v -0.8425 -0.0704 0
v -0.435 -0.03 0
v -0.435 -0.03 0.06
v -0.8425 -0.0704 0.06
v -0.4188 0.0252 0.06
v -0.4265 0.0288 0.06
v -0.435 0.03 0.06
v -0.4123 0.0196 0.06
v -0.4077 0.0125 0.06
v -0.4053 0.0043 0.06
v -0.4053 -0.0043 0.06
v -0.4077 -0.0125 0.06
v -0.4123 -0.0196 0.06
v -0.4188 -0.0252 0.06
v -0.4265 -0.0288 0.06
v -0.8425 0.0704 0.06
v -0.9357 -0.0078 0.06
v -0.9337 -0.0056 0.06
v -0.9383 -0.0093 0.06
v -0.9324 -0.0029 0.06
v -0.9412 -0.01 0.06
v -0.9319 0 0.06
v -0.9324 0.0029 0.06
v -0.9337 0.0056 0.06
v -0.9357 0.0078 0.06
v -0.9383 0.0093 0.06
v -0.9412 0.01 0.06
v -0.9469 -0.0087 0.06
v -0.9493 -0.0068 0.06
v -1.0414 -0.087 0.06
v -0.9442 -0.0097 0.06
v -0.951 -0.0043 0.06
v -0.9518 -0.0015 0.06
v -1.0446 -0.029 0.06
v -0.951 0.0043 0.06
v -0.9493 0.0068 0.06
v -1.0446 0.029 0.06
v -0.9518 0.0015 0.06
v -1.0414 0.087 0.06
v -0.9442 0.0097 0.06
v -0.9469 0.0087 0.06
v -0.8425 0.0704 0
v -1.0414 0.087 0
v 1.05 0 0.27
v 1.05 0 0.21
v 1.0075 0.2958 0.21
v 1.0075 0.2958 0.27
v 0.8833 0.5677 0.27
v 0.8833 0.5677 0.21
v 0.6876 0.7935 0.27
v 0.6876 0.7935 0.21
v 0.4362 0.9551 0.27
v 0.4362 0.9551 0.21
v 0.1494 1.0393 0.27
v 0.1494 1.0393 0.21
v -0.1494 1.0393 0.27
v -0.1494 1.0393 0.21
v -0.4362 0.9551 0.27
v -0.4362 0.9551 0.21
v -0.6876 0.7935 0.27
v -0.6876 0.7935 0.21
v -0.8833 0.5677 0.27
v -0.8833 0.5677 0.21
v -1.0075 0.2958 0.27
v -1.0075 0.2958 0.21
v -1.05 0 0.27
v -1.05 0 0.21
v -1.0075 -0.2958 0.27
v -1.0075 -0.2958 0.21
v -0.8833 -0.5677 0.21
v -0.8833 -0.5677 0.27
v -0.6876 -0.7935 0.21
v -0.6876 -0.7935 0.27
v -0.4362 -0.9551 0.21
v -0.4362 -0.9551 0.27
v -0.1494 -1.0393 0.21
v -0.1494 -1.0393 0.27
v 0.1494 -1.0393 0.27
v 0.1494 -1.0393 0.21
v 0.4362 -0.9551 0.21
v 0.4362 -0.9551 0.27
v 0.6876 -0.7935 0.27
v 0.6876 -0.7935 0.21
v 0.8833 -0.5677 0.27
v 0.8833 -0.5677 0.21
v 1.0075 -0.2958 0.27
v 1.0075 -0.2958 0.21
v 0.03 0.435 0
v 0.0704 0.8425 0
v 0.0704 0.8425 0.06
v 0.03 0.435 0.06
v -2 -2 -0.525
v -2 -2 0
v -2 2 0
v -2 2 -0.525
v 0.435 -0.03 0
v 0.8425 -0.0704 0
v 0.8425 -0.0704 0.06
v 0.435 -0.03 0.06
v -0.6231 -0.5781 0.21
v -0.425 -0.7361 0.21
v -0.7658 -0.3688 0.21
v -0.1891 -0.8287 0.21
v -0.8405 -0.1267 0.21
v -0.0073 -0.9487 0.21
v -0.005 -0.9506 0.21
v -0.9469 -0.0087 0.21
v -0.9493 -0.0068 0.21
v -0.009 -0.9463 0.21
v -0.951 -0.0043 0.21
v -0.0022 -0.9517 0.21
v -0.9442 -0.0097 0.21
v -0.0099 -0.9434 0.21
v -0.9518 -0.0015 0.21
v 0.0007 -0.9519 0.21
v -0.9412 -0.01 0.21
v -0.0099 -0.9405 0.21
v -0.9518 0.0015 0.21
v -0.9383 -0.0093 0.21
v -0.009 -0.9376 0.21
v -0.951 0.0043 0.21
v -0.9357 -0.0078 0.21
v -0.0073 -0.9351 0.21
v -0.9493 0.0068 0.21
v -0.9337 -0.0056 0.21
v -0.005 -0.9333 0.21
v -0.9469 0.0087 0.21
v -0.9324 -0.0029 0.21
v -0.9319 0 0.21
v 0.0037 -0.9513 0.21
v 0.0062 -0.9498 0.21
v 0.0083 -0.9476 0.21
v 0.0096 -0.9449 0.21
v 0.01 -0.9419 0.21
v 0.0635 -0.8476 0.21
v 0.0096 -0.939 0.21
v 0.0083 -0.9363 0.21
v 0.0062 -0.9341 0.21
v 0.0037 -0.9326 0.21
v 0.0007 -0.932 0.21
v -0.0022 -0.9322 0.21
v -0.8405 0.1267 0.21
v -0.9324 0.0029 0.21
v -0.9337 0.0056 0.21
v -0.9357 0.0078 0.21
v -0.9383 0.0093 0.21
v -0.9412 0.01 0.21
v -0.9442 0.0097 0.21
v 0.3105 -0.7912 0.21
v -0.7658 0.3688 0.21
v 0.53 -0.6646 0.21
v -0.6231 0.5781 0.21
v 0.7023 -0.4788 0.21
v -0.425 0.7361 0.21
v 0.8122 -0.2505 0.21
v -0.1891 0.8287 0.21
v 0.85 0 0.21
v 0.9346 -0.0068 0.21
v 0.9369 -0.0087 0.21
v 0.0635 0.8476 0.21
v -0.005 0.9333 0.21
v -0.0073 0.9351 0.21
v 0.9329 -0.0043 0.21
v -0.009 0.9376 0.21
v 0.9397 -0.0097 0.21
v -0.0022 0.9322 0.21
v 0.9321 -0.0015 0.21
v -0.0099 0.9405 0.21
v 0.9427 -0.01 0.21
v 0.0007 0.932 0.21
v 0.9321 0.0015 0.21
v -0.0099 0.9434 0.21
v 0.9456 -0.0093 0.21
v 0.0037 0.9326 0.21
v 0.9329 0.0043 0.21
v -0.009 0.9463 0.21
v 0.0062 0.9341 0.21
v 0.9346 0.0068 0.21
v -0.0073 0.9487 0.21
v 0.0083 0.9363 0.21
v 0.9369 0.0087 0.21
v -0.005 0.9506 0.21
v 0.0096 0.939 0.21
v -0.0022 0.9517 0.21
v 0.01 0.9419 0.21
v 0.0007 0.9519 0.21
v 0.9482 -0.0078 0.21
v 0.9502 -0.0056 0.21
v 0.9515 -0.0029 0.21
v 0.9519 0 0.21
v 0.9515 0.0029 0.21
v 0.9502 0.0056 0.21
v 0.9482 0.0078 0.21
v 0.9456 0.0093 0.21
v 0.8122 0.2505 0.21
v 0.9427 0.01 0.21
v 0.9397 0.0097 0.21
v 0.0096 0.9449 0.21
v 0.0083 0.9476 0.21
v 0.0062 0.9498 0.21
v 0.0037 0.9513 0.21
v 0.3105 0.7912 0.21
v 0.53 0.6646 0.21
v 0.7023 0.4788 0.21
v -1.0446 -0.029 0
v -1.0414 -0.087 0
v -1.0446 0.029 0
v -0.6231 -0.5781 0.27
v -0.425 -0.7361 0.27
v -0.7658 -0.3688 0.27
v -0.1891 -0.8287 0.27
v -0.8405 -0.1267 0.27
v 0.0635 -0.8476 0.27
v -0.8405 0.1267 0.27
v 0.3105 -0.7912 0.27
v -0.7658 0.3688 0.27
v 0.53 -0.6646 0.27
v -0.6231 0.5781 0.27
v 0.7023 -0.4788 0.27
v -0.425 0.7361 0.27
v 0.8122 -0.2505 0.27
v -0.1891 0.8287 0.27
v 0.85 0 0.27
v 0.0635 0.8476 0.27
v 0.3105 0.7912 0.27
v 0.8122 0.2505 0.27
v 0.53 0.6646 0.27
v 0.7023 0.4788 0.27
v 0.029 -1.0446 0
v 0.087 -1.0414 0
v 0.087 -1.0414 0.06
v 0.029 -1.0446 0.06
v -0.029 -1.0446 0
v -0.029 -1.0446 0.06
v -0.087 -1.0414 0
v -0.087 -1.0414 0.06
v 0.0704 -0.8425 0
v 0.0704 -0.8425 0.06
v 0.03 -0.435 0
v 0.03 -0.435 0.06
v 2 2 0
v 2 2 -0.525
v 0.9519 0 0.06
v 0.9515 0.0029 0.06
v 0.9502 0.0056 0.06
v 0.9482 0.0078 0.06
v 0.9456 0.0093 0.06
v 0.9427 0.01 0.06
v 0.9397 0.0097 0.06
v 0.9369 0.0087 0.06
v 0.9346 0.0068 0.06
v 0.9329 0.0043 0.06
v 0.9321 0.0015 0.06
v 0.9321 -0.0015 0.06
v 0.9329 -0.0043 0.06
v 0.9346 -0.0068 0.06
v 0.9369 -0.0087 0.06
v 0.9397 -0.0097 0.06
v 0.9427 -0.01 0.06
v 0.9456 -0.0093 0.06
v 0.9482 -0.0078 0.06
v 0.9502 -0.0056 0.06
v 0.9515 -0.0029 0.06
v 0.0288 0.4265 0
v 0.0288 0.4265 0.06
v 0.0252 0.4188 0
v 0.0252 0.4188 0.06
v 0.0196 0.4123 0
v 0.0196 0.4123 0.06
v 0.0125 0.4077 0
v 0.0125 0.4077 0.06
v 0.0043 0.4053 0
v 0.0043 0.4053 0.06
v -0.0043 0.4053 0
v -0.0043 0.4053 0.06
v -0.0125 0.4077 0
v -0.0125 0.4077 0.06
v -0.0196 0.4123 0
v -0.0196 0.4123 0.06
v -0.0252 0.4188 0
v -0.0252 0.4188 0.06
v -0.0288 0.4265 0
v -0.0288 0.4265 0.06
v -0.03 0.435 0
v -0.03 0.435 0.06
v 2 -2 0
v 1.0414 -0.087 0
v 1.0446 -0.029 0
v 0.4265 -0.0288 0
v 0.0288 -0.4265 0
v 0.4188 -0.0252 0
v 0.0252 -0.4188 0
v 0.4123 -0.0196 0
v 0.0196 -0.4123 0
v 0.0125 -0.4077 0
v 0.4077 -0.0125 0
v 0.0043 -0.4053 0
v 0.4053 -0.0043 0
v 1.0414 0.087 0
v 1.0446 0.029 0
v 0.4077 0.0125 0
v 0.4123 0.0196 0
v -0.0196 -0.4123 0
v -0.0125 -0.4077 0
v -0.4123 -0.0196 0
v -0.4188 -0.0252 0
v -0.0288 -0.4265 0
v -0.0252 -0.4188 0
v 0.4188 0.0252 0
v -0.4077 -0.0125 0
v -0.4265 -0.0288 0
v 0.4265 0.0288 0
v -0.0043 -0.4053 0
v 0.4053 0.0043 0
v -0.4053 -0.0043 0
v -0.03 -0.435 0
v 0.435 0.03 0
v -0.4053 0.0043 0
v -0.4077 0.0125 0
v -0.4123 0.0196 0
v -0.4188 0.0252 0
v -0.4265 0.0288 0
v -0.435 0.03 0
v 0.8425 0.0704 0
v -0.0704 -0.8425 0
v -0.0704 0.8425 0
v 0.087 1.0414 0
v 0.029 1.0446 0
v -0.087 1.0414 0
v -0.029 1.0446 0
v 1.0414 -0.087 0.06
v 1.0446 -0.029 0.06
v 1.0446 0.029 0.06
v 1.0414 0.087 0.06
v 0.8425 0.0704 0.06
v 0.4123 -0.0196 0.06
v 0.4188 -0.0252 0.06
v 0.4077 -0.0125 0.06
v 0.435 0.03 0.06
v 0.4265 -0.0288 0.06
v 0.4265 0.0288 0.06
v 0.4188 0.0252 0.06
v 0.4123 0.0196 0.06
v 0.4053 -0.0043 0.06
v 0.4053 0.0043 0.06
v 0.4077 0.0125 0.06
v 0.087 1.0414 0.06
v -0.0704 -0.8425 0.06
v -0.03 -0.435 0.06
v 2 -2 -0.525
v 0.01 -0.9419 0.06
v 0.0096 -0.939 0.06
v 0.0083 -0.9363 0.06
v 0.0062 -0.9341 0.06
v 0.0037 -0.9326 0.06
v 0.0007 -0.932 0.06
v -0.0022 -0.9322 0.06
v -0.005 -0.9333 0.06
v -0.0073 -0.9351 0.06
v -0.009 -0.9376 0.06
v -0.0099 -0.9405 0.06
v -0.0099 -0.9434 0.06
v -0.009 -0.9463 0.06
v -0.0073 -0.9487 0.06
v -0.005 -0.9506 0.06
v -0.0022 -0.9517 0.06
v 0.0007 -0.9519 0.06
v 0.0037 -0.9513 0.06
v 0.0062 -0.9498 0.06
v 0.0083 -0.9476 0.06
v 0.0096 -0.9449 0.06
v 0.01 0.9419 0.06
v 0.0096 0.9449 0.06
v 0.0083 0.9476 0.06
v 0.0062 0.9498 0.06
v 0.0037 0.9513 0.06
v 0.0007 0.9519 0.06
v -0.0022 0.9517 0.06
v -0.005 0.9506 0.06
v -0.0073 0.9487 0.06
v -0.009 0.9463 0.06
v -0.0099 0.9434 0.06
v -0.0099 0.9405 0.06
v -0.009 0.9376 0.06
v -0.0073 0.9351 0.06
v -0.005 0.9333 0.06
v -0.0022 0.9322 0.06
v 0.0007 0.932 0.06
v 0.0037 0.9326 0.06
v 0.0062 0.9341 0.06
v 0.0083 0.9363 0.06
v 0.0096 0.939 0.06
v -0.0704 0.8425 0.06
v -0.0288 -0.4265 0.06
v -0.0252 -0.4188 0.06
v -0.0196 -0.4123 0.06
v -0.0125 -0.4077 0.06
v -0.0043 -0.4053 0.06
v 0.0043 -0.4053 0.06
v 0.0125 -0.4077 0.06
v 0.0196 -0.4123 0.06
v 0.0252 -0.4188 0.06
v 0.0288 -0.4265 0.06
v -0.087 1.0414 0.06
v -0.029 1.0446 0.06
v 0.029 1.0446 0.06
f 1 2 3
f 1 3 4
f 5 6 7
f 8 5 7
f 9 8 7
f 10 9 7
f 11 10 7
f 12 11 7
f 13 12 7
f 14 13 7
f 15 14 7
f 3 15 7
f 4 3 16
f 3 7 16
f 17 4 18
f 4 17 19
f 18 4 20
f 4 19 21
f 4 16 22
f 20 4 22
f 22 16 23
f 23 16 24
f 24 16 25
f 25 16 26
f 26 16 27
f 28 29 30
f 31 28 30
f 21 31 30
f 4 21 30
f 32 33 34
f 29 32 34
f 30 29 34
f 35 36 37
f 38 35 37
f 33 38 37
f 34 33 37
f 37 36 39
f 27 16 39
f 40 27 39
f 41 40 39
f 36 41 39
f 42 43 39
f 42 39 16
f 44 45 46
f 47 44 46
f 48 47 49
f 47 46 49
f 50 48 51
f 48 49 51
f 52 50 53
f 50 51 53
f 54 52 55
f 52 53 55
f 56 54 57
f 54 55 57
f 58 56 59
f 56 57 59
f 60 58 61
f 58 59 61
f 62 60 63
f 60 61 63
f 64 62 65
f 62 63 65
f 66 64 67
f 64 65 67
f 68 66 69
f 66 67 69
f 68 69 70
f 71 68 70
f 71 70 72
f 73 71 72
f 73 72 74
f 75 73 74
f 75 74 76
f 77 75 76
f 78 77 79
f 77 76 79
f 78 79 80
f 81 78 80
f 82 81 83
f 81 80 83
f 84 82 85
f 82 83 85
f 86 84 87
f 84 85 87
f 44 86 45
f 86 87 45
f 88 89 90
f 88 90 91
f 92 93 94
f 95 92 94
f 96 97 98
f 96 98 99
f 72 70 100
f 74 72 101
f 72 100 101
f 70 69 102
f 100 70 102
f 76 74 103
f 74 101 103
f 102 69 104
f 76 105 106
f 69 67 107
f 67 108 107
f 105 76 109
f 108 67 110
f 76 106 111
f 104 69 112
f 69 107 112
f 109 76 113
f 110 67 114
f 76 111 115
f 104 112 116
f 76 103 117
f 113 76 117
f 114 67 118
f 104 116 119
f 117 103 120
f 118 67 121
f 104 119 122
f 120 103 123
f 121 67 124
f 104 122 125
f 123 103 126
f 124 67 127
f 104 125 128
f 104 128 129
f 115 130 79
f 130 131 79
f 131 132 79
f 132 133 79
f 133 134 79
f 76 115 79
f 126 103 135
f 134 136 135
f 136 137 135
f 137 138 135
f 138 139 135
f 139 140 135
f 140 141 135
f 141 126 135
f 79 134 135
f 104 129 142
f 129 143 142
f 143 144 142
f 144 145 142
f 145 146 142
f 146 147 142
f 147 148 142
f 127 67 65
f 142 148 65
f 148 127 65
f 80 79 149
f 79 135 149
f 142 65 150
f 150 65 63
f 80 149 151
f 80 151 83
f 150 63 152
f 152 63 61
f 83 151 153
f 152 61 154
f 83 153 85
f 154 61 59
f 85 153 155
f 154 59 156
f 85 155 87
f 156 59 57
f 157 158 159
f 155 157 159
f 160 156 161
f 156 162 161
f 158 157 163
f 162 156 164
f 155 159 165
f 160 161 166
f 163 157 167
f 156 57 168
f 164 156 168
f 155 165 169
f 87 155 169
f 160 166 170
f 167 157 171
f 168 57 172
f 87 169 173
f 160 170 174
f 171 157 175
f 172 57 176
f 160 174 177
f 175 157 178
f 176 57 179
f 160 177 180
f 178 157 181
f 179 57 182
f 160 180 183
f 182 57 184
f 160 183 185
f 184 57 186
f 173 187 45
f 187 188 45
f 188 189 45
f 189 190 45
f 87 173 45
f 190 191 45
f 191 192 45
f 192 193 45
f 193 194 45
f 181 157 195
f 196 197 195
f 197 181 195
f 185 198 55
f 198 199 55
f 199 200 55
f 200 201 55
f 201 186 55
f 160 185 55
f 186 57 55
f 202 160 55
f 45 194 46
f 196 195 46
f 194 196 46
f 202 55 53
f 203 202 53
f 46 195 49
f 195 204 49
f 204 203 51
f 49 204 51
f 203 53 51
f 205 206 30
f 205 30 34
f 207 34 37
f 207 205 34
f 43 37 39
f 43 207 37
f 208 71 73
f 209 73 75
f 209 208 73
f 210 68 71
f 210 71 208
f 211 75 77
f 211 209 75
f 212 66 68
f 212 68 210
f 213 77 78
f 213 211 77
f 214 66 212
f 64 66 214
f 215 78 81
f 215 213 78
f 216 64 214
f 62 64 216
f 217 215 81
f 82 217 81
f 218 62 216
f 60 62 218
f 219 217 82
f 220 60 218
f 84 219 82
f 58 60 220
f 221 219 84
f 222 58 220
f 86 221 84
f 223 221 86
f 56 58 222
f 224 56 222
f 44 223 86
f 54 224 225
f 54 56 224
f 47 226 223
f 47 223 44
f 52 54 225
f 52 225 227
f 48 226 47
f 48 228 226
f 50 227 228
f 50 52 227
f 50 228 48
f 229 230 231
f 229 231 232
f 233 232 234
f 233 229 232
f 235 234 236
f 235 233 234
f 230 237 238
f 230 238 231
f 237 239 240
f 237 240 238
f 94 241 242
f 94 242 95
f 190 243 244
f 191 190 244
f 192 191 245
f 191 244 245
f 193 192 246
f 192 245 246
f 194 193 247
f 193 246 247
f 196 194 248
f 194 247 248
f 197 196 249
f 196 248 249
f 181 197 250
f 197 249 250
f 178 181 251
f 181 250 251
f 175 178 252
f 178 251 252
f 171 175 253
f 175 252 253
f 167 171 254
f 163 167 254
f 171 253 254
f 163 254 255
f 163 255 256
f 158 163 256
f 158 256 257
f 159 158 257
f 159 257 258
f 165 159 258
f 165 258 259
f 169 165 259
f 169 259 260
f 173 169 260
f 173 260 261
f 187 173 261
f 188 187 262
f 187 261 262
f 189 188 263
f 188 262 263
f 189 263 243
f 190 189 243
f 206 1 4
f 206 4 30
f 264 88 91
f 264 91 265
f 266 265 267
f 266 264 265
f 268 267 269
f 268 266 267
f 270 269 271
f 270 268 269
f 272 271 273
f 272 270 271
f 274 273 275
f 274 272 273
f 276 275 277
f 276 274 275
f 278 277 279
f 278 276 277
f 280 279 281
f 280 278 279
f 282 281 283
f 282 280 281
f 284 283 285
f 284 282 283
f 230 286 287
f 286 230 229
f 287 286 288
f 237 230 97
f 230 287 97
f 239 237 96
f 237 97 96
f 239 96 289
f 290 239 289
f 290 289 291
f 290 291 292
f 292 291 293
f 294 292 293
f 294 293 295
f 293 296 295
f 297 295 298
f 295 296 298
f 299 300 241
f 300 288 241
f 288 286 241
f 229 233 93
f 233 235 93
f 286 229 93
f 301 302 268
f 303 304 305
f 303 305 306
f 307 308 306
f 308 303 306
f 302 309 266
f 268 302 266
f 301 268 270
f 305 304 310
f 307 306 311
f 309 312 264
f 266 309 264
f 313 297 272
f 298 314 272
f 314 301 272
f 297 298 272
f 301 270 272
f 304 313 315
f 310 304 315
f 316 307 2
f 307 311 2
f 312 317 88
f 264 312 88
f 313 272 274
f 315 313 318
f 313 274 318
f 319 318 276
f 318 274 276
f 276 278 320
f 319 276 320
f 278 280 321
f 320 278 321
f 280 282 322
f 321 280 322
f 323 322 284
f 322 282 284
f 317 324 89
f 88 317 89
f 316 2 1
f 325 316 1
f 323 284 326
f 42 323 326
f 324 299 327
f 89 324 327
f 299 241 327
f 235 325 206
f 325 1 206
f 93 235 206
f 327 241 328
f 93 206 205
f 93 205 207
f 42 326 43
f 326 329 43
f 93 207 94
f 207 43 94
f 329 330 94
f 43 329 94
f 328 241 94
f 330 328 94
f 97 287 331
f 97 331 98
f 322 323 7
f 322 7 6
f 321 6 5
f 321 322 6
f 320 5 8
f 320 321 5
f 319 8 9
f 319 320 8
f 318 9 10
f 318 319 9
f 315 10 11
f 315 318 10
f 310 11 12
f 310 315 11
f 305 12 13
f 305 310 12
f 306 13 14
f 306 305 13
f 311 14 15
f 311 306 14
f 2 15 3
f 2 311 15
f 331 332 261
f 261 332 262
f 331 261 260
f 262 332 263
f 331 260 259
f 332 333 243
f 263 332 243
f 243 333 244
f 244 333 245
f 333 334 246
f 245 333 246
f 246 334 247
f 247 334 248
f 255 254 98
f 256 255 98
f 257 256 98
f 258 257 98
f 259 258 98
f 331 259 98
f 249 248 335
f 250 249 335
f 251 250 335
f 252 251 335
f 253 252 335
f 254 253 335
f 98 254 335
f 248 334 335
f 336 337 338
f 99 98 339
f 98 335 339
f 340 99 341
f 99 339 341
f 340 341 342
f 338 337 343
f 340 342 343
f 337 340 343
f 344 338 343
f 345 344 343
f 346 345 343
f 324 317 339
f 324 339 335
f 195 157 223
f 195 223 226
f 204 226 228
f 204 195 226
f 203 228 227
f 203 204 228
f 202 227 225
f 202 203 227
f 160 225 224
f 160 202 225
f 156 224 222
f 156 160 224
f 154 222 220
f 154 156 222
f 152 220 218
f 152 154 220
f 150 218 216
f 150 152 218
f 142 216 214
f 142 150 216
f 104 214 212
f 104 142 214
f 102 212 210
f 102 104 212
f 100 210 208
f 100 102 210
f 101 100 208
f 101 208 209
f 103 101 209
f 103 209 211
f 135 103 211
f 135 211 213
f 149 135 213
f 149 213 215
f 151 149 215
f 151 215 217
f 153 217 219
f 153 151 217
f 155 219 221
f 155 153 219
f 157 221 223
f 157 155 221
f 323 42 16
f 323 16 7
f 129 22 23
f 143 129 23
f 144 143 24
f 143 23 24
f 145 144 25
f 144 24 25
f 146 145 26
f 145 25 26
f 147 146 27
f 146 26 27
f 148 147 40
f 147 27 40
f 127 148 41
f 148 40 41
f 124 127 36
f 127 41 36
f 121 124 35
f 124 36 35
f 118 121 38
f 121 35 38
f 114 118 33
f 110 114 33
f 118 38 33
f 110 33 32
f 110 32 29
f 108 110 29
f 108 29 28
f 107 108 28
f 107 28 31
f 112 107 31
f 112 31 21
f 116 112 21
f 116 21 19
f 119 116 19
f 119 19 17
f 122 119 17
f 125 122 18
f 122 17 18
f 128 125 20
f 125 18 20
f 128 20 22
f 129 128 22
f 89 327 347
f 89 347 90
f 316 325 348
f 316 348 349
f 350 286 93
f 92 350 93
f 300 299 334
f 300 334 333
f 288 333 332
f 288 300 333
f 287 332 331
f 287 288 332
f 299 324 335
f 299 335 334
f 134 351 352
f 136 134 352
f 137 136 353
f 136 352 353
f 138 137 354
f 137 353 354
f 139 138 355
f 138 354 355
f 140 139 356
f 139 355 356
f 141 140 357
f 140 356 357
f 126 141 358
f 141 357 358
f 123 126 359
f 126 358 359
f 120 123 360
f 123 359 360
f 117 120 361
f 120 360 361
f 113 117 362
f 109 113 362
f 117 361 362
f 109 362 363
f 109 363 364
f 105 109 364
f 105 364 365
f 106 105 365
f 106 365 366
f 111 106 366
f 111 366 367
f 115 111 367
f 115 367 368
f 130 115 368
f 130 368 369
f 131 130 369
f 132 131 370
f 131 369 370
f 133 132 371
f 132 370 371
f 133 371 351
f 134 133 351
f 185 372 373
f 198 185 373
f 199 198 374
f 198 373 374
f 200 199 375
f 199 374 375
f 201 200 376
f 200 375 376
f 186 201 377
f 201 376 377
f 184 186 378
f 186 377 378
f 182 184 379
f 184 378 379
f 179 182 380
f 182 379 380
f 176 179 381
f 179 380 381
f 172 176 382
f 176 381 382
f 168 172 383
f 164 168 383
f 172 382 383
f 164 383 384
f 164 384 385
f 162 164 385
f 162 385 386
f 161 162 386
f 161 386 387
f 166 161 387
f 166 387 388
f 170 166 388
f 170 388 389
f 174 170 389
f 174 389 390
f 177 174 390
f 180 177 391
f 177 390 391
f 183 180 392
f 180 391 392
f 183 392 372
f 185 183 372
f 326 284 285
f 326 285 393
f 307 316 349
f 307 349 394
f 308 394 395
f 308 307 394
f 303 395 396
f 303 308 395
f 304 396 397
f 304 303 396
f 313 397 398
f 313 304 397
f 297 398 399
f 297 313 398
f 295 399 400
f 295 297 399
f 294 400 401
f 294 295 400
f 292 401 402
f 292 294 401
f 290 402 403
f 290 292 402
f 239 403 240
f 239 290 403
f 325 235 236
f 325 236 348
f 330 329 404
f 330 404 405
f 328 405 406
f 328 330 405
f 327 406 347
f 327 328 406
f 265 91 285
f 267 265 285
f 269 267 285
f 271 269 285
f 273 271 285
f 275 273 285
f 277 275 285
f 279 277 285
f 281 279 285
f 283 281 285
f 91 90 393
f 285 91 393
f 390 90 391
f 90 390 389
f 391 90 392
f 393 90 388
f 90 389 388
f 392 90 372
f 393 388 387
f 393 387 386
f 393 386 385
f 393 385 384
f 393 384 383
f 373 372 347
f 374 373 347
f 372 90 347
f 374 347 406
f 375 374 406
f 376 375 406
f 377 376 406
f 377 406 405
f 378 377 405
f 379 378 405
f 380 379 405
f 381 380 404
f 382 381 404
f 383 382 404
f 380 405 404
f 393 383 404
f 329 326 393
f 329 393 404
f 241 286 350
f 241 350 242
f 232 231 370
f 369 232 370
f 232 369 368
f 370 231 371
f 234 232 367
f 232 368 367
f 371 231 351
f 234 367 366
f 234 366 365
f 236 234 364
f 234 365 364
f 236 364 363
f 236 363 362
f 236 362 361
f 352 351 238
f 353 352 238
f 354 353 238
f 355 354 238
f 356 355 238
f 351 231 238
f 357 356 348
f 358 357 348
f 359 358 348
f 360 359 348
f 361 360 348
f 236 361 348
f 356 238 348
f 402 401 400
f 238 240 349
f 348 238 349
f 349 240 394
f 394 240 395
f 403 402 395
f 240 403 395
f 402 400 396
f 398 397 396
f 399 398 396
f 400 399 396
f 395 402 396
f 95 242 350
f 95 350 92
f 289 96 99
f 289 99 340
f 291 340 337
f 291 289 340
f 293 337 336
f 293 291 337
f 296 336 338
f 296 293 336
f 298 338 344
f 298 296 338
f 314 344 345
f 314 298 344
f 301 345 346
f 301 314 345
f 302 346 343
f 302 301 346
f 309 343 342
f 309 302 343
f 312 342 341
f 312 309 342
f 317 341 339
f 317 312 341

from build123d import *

# Parameters (mm, degrees)
EXTRUDE_1_DEPTH   = 0.06
EXTRUDE_1_2_DEPTH = 0.06
EXTRUDE_1_3_DEPTH = 0.06
EXTRUDE_1_4_DEPTH = 0.06
SKETCH_2_R        = 0.01
EXTRUDE_2_DEPTH   = 0.15
SKETCH_3_R        = 1.05
SKETCH_3_R_2      = 0.85
EXTRUDE_3_DEPTH   = 0.06
SKETCH_4_W        = 4
SKETCH_4_H        = 4
EXTRUDE_5_DEPTH   = 0.525


with BuildPart() as part:
    # 草圖1 → 填料-伸長1 (new body)
    with BuildSketch(Plane.XY):
        with BuildLine():
            Line((-0.03, 0.435), (-0.070388149, 0.842515581))
            Line((-0.070388149, 0.842515581), (-0.087001654, 1.041372033))
            ThreePointArc((-0.087001654, 1.041372033), (0, 1.045), (0.087001654, 1.041372033))
            Line((0.087001654, 1.041372033), (0.070388149, 0.842515581))
            Line((0.070388149, 0.842515581), (0.03, 0.435))
            ThreePointArc((0.03, 0.435), (0, 0.405), (-0.03, 0.435))
        make_face()
    extrude(amount=EXTRUDE_1_DEPTH)



with BuildPart() as body_2:
    # 草圖1 → Extrude 1 2 (new body)
    with BuildSketch(Plane.XY):
        with BuildLine():
            Line((0.435, 0.03), (0.842515581, 0.070388149))
            Line((0.842515581, 0.070388149), (1.041372033, 0.087001654))
            ThreePointArc((1.041372033, 0.087001654), (1.045, 0), (1.041372033, -0.087001654))
            Line((1.041372033, -0.087001654), (0.842515581, -0.070388149))
            Line((0.842515581, -0.070388149), (0.435, -0.03))
            ThreePointArc((0.435, -0.03), (0.405, 0), (0.435, 0.03))
        make_face()
    extrude(amount=EXTRUDE_1_2_DEPTH)


with BuildPart() as body_3:
    # 草圖1 → Extrude 1 3 (new body)
    with BuildSketch(Plane.XY):
        with BuildLine():
            Line((0.03, -0.435), (0.070388149, -0.842515581))
            Line((0.070388149, -0.842515581), (0.087001654, -1.041372033))
            ThreePointArc((0.087001654, -1.041372033), (0, -1.045), (-0.087001654, -1.041372033))
            Line((-0.087001654, -1.041372033), (-0.070388149, -0.842515581))
            Line((-0.070388149, -0.842515581), (-0.03, -0.435))
            ThreePointArc((-0.03, -0.435), (0, -0.405), (0.03, -0.435))
        make_face()
    extrude(amount=EXTRUDE_1_3_DEPTH)


with BuildPart() as body_4:
    # 草圖1 → Extrude 1 4 (new body)
    with BuildSketch(Plane.XY):
        with BuildLine():
            Line((-0.435, -0.03), (-0.842515581, -0.070388149))
            Line((-0.842515581, -0.070388149), (-1.041372033, -0.087001654))
            ThreePointArc((-1.041372033, -0.087001654), (-1.045, 0), (-1.041372033, 0.087001654))
            Line((-1.041372033, 0.087001654), (-0.842515581, 0.070388149))
            Line((-0.842515581, 0.070388149), (-0.435, 0.03))
            ThreePointArc((-0.435, 0.03), (-0.405, 0), (-0.435, -0.03))
        make_face()
    extrude(amount=EXTRUDE_1_4_DEPTH)


with BuildPart() as part_1:
    add(part.part)

    add(body_2.part)  # 填料-伸長2 merges body 2

    add(body_3.part)  # 填料-伸長2 merges body 3

    add(body_4.part)  # 填料-伸長2 merges body 4
    # 草圖2 → 填料-伸長2 (add)
    with BuildSketch(Plane.XY.offset(0.06)):
        with Locations((0.941943807, 0)):
            Circle(SKETCH_2_R)
        with Locations((0, 0.941943807)):
            Circle(SKETCH_2_R)
        with Locations((-0.941943807, 0)):
            Circle(SKETCH_2_R)
        with Locations((0, -0.941943807)):
            Circle(SKETCH_2_R)
    extrude(amount=EXTRUDE_2_DEPTH)

    # 草圖3 → 填料-伸長3 (add)
    with BuildSketch(Plane.XY.offset(0.21)):
        Circle(SKETCH_3_R)
        Circle(SKETCH_3_R_2, mode=Mode.SUBTRACT)
    extrude(amount=EXTRUDE_3_DEPTH)

    # 草圖4 → 填料-伸長5 (add)
    with BuildSketch(Plane(origin=(0, 0, 0), x_dir=(-1, 0, 0), z_dir=(0, 0, -1))):
        Rectangle(SKETCH_4_W, SKETCH_4_H)
    extrude(amount=EXTRUDE_5_DEPTH)


solid = part_1.part
